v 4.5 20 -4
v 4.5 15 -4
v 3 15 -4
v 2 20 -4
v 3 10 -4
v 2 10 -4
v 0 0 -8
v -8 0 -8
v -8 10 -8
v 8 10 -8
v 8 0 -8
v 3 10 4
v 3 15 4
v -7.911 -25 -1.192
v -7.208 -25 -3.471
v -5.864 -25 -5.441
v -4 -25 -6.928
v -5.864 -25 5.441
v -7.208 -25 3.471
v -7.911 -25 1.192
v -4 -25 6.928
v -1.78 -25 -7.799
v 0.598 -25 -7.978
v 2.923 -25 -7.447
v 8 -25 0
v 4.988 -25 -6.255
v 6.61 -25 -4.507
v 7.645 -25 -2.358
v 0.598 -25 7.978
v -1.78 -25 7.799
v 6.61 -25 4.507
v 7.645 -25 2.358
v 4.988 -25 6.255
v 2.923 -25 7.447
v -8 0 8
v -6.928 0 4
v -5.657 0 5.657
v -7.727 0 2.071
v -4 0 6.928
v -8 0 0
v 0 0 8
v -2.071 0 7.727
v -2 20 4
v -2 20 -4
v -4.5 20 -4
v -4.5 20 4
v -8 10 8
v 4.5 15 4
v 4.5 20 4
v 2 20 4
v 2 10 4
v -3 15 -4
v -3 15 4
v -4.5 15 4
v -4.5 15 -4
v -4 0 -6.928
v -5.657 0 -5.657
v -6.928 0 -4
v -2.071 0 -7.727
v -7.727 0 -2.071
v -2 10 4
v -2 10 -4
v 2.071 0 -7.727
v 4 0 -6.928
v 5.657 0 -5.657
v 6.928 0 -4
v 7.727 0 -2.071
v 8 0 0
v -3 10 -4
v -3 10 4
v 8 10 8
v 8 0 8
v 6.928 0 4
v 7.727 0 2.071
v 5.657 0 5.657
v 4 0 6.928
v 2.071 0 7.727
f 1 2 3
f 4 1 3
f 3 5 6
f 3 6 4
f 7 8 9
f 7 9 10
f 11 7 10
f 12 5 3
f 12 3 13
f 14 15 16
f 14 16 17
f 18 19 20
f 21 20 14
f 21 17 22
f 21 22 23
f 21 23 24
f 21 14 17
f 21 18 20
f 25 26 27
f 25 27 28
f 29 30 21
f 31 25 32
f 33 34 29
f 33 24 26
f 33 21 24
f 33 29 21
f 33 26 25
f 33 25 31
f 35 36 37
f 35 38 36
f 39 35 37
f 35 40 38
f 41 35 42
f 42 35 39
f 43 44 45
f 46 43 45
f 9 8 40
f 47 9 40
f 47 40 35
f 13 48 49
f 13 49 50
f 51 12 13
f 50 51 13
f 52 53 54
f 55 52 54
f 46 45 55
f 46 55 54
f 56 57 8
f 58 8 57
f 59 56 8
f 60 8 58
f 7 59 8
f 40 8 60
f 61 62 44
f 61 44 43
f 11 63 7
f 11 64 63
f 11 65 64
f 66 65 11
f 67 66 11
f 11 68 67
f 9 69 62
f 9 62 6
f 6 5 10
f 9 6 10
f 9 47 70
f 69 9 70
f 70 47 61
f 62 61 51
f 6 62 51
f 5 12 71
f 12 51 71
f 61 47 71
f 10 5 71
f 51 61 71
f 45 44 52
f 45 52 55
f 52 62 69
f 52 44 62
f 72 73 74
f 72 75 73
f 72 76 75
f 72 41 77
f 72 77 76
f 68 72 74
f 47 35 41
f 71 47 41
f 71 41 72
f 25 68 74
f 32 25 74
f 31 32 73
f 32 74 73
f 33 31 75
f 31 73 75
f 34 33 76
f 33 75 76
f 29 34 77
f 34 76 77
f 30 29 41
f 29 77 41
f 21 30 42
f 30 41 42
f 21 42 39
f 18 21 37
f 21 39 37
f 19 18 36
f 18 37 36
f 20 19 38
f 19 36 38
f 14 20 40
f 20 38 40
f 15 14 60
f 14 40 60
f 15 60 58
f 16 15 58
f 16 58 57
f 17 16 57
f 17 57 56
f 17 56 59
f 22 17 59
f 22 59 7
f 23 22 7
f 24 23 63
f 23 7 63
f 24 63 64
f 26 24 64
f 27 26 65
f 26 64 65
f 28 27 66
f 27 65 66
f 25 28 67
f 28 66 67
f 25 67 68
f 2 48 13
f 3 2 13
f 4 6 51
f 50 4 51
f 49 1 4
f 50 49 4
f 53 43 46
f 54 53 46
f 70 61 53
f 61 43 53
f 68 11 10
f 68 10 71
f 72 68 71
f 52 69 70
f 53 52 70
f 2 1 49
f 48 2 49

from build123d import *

# Parameters (mm, degrees)
F0_R     = 8
F1_DEPTH = 25
F2_W     = 16
F2_H     = 16
F3_DEPTH = 10
F4_W     = 1
F4_H     = 8
F5_DEPTH = 10
F6_W     = 2.5
F6_H     = 8
F7_DEPTH = 5


with BuildPart() as f1:
    # F0 (on Front) → F1 (new body)
    with BuildSketch(Plane.XZ):
        Circle(F0_R)
    extrude(amount=F1_DEPTH)

    # F2 (on face) → F3 (join)
    with BuildSketch(Plane.XZ):
        Rectangle(F2_W, F2_H)
    extrude(amount=-F3_DEPTH)

    # F4 (on face) → F5 (join)
    with BuildSketch(Plane(origin=(0, 10, 0), x_dir=(-1, 0, 0), z_dir=(0, 1, 0))):
        with Locations((2.5, 0)):
            Rectangle(F4_W, F4_H)
        with Locations((-2.5, 0)):
            Rectangle(F4_W, F4_H)
    extrude(amount=F5_DEPTH)

    # F6 (on face) → F7 (join)
    with BuildSketch(Plane(origin=(0, 20, 0), x_dir=(-1, 0, 0), z_dir=(0, 1, 0))):
        with Locations((3.25, 0)):
            Rectangle(F6_W, F6_H)
        with Locations((-3.25, 0)):
            Rectangle(F6_W, F6_H)
    extrude(amount=-F7_DEPTH)


solid = f1.part
